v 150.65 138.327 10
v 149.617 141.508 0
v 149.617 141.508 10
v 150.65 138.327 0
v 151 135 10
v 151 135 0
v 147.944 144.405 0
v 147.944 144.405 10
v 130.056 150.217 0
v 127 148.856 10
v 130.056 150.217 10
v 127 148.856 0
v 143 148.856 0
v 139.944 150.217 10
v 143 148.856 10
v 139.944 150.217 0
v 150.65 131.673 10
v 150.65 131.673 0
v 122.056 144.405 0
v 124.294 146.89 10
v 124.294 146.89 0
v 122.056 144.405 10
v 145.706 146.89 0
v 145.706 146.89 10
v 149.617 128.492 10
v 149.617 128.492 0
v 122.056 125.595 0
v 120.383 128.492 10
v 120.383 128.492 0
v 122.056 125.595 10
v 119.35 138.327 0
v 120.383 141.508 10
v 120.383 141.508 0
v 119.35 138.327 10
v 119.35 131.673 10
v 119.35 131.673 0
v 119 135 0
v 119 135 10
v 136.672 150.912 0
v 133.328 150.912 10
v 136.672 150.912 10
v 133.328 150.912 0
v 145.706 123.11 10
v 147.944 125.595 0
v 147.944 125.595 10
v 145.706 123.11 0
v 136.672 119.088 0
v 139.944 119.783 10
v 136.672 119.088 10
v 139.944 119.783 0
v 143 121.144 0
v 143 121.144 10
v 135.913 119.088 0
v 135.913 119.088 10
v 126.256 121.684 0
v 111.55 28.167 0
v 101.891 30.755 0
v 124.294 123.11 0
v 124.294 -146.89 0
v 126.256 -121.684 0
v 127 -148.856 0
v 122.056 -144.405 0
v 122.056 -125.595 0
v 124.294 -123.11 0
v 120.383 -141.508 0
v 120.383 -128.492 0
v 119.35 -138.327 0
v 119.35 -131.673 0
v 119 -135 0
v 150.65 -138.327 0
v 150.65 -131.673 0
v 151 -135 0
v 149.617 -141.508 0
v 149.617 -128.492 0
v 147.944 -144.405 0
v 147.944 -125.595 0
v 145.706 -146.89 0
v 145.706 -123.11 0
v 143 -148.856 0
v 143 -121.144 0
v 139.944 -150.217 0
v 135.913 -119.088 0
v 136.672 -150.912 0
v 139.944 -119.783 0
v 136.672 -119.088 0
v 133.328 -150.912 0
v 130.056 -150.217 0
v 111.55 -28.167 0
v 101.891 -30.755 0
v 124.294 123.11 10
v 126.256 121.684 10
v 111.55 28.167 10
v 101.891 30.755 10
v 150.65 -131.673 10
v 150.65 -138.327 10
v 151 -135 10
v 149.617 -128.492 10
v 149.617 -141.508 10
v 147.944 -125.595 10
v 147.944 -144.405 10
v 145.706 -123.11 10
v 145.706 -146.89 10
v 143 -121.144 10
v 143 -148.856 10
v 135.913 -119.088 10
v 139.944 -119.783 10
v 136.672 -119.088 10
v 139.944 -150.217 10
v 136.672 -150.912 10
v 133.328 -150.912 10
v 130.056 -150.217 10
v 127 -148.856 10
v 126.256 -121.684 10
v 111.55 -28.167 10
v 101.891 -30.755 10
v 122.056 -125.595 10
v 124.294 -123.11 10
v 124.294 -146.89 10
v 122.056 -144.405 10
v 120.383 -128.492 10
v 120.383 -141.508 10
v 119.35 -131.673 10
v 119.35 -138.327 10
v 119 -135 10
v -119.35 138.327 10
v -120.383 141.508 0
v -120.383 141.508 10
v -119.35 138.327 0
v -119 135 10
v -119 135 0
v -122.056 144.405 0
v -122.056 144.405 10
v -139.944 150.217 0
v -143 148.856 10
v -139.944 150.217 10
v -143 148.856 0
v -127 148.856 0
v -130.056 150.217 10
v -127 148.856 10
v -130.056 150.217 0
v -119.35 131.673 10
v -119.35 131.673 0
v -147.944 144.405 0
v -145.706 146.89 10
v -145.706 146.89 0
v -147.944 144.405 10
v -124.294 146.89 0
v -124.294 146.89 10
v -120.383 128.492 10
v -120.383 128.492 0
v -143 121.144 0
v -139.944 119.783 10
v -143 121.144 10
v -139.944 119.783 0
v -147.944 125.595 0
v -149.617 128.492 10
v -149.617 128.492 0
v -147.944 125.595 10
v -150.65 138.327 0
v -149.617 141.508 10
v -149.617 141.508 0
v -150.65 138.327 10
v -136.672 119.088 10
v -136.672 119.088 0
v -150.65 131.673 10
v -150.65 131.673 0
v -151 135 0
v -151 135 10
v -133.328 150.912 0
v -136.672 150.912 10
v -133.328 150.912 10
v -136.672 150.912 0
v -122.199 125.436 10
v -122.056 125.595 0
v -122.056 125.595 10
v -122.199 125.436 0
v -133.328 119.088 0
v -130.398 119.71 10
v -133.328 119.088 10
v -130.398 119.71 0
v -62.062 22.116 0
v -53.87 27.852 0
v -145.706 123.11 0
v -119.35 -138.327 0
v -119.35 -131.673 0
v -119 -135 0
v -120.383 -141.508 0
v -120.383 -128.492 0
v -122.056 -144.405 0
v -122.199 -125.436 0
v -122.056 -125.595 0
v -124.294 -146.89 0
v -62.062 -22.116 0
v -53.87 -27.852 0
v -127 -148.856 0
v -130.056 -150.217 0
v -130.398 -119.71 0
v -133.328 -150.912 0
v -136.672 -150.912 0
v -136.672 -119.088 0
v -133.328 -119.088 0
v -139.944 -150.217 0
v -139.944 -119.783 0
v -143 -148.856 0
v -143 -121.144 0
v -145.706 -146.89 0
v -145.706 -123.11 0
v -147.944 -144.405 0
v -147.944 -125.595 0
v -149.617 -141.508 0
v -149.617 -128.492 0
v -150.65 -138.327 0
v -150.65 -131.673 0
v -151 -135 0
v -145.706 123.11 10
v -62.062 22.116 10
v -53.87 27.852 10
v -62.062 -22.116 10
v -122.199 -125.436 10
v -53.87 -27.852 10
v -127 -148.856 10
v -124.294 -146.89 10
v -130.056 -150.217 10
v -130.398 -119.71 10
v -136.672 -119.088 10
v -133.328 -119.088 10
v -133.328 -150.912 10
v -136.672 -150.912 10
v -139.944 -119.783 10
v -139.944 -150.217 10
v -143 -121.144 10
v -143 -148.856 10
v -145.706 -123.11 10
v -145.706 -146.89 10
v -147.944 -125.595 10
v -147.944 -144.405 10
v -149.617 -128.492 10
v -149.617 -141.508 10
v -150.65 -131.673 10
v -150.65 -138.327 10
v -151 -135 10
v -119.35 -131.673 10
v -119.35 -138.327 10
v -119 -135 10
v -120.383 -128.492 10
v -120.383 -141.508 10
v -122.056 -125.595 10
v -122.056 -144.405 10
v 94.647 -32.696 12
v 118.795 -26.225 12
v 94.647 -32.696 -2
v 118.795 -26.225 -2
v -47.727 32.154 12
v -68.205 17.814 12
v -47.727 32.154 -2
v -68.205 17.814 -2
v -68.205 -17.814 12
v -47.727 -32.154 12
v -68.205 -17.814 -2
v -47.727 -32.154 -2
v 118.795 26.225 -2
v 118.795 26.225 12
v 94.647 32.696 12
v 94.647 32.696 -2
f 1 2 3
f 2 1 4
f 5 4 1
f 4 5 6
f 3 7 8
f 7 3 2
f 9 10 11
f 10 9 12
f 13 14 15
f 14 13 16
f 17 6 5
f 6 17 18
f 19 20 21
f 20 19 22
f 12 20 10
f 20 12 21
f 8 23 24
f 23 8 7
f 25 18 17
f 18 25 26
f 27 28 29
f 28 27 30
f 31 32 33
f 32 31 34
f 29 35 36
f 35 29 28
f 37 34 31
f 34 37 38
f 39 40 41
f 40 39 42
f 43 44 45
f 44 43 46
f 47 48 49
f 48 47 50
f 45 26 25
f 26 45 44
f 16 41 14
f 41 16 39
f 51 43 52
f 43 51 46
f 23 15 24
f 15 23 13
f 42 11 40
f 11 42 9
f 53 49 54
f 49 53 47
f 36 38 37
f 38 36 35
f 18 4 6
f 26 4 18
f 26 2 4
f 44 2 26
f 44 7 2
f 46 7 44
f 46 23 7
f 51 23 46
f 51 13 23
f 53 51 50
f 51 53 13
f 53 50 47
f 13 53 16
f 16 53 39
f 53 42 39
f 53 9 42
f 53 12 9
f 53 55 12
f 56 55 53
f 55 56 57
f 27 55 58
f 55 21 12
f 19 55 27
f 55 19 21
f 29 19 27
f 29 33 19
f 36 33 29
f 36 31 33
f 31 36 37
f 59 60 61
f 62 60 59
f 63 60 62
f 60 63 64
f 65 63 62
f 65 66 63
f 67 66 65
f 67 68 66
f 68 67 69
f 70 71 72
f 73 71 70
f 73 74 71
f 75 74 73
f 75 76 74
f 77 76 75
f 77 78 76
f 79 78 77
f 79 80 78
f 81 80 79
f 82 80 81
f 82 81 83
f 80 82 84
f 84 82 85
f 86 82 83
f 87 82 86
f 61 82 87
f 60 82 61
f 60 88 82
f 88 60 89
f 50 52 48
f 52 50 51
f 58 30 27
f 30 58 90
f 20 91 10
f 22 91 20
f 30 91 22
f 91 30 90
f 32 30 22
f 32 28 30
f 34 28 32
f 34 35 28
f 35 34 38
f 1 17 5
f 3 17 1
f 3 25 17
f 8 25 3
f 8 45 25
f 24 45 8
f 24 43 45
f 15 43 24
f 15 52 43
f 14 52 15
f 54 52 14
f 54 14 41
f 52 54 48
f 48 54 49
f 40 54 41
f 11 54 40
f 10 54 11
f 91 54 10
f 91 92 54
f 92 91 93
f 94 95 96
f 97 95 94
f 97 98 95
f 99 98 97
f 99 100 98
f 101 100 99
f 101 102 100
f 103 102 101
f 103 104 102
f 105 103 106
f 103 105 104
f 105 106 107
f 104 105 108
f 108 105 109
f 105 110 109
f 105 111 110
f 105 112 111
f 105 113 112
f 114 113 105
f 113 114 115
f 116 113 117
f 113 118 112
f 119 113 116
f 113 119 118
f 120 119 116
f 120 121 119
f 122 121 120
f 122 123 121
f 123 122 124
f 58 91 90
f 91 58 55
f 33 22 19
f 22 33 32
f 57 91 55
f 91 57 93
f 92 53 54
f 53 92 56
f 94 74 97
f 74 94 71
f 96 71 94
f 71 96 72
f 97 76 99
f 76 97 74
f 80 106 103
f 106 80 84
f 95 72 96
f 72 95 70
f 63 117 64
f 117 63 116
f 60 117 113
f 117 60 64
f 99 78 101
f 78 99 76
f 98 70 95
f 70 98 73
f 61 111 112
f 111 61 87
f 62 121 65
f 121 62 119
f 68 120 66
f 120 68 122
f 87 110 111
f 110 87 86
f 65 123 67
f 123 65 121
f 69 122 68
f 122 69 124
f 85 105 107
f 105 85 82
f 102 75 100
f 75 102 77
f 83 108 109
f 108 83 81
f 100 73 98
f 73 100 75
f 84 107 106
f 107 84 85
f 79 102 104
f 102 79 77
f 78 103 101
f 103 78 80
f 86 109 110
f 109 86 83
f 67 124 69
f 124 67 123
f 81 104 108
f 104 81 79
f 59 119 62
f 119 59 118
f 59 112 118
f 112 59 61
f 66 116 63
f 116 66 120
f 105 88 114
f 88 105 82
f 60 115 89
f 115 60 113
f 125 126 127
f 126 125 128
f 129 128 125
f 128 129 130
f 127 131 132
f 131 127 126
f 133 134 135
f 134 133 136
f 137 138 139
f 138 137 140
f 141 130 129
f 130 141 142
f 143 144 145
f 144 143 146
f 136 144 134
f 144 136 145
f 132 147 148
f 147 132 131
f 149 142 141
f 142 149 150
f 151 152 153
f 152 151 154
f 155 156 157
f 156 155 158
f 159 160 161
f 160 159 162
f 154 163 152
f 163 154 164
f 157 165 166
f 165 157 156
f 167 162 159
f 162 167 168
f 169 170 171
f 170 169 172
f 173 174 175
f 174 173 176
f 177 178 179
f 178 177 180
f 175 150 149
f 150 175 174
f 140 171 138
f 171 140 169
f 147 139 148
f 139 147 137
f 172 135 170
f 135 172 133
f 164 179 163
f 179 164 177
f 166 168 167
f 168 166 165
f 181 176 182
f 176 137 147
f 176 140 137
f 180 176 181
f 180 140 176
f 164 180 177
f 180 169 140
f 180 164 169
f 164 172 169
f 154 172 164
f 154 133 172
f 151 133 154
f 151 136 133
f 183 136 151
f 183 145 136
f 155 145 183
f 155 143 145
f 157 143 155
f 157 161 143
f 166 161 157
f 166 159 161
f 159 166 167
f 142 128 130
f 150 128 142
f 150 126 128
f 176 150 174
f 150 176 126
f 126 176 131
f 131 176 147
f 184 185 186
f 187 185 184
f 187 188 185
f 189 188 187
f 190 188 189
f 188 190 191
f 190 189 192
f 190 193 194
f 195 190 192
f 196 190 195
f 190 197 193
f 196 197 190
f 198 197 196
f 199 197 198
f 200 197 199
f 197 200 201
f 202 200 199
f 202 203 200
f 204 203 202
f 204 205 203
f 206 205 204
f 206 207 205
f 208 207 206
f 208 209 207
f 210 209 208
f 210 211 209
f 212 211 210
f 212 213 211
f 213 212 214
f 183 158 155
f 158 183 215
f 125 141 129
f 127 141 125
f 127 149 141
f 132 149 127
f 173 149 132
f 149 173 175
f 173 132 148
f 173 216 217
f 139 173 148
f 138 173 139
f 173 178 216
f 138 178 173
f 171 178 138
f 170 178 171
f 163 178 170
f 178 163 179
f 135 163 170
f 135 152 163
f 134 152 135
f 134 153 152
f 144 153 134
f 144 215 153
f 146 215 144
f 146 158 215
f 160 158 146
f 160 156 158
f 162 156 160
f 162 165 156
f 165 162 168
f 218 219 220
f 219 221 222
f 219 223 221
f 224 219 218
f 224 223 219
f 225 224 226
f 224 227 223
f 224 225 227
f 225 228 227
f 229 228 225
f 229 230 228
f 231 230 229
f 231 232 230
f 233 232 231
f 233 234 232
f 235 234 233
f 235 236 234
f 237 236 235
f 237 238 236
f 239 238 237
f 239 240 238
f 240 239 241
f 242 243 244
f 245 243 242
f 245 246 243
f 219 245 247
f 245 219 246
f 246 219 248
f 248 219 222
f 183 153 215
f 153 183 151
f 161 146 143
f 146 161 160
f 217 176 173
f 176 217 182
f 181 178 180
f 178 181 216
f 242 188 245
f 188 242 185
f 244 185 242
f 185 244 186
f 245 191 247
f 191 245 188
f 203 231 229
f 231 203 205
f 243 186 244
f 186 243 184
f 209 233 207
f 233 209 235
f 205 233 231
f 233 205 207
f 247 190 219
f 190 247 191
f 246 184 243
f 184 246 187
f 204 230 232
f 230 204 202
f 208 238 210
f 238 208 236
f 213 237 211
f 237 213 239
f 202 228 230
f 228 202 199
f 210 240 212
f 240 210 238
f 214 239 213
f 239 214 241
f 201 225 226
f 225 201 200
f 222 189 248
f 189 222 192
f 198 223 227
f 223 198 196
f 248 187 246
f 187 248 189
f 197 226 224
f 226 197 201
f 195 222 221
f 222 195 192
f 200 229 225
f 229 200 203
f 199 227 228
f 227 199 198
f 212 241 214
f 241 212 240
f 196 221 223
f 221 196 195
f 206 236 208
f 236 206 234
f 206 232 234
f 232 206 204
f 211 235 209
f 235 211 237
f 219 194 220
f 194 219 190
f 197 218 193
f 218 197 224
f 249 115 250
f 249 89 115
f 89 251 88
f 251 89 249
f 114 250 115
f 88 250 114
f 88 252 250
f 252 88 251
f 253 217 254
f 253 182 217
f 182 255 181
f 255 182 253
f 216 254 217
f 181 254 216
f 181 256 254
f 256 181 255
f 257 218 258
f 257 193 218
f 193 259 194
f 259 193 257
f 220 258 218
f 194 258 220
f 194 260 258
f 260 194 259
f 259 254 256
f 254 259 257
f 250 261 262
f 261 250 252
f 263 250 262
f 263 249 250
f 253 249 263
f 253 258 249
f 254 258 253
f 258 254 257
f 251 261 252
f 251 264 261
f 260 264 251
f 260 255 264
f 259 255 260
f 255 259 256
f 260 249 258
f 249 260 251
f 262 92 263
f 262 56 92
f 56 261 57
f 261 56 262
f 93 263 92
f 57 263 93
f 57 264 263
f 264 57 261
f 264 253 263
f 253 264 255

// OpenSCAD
PROPELLER_D = 8*25.4;
SIZE = 270;
BASE_SHAPE_R = 3;
BASE_SHAPE_WIDTH = 60;
HALF_SIZE = SIZE/2;
FRONT_ARM_ANGLE = 15;
REAR_ARM_ANGLE = 35;
FRONT_ARM_SIZE = HALF_SIZE/cos(FRONT_ARM_ANGLE);
REAR_ARM_SIZE = HALF_SIZE/cos(REAR_ARM_ANGLE);
/*
translate([HALF_SIZE,HALF_SIZE,0]) propeller();
translate([-HALF_SIZE,HALF_SIZE,0]) propeller();
translate([HALF_SIZE,-HALF_SIZE,0]) propeller();
translate([-HALF_SIZE,-HALF_SIZE,0]) propeller();
*/
//translate([25,0,5]) cube([185,60,10], true);

color("white") {
    frontArms();
    rearArms();
    baseShape();
}

module baseShape(h=10) {
    
    frontDelta = HALF_SIZE - sqrt(FRONT_ARM_SIZE*FRONT_ARM_SIZE - HALF_SIZE*HALF_SIZE);
    rearDelta = HALF_SIZE - sqrt(REAR_ARM_SIZE*REAR_ARM_SIZE - HALF_SIZE*HALF_SIZE);

    color("gray") hull() {
        translate([frontDelta,0,0]) {
            rotate([0,0,90-FRONT_ARM_ANGLE]) {
                translate([BASE_SHAPE_WIDTH/2,0,5]) cube([1,25,14], true);
            }
            rotate([0,0,-90+FRONT_ARM_ANGLE]) {
                translate([BASE_SHAPE_WIDTH/2,0,5]) cube([1,25,14], true);
            }        
        }
        translate([-rearDelta,0,0]) {
            rotate([0,0,-90-REAR_ARM_ANGLE]) {
                translate([BASE_SHAPE_WIDTH/2,0,5]) cube([1,25,14], true);
            }
            rotate([0,0,90+REAR_ARM_ANGLE]) {
                translate([BASE_SHAPE_WIDTH/2,0,5]) cube([1,25,14], true);
            }        
        }    
    }
    
}

module rearArms() {
    rearArmLeft();
    rearArmRight();
}

module rearArmLeft() {
    translate([-HALF_SIZE,HALF_SIZE,0]) {
        cylinder(d=32, h=10);
        rotate([0,0,90+REAR_ARM_ANGLE]) translate([-REAR_ARM_SIZE/2,0,5]) {
            cube([REAR_ARM_SIZE, 10, 10], true);
        }
    }
}

module rearArmRight() {
    translate([-HALF_SIZE,-HALF_SIZE,0]) {
        cylinder(d=32, h=10);
        rotate([0,0,-90-REAR_ARM_ANGLE]) translate([-REAR_ARM_SIZE/2,0,5]) {
            cube([REAR_ARM_SIZE, 10, 10], true);
        }
    }
}

module frontArms() {
    frontArmLeft();
    frontArmRight();
}

module frontArmLeft() {
    translate([HALF_SIZE,HALF_SIZE,0]) {
        cylinder(d=32, h=10);
        rotate([0,0,90-FRONT_ARM_ANGLE]) translate([-FRONT_ARM_SIZE/2,0,5]) {
            cube([FRONT_ARM_SIZE, 10, 10], true);
        }
    }
}

module frontArmRight() {
    translate([HALF_SIZE,-HALF_SIZE,0]) {
        cylinder(d=32, h=10);
        rotate([0,0,-90+FRONT_ARM_ANGLE]) translate([-FRONT_ARM_SIZE/2,0,5]) {
            cube([FRONT_ARM_SIZE, 10, 10], true);
        }
    }
}

module propeller() {
    //translate([0,0,35]) #cylinder(d=PROPELLER_D, h=5);
    translate([0,0,5]) {
        color("gold") cylinder(d=28, h=25);
        color("gray") cylinder(d=3.17, h=37);
    }
}
